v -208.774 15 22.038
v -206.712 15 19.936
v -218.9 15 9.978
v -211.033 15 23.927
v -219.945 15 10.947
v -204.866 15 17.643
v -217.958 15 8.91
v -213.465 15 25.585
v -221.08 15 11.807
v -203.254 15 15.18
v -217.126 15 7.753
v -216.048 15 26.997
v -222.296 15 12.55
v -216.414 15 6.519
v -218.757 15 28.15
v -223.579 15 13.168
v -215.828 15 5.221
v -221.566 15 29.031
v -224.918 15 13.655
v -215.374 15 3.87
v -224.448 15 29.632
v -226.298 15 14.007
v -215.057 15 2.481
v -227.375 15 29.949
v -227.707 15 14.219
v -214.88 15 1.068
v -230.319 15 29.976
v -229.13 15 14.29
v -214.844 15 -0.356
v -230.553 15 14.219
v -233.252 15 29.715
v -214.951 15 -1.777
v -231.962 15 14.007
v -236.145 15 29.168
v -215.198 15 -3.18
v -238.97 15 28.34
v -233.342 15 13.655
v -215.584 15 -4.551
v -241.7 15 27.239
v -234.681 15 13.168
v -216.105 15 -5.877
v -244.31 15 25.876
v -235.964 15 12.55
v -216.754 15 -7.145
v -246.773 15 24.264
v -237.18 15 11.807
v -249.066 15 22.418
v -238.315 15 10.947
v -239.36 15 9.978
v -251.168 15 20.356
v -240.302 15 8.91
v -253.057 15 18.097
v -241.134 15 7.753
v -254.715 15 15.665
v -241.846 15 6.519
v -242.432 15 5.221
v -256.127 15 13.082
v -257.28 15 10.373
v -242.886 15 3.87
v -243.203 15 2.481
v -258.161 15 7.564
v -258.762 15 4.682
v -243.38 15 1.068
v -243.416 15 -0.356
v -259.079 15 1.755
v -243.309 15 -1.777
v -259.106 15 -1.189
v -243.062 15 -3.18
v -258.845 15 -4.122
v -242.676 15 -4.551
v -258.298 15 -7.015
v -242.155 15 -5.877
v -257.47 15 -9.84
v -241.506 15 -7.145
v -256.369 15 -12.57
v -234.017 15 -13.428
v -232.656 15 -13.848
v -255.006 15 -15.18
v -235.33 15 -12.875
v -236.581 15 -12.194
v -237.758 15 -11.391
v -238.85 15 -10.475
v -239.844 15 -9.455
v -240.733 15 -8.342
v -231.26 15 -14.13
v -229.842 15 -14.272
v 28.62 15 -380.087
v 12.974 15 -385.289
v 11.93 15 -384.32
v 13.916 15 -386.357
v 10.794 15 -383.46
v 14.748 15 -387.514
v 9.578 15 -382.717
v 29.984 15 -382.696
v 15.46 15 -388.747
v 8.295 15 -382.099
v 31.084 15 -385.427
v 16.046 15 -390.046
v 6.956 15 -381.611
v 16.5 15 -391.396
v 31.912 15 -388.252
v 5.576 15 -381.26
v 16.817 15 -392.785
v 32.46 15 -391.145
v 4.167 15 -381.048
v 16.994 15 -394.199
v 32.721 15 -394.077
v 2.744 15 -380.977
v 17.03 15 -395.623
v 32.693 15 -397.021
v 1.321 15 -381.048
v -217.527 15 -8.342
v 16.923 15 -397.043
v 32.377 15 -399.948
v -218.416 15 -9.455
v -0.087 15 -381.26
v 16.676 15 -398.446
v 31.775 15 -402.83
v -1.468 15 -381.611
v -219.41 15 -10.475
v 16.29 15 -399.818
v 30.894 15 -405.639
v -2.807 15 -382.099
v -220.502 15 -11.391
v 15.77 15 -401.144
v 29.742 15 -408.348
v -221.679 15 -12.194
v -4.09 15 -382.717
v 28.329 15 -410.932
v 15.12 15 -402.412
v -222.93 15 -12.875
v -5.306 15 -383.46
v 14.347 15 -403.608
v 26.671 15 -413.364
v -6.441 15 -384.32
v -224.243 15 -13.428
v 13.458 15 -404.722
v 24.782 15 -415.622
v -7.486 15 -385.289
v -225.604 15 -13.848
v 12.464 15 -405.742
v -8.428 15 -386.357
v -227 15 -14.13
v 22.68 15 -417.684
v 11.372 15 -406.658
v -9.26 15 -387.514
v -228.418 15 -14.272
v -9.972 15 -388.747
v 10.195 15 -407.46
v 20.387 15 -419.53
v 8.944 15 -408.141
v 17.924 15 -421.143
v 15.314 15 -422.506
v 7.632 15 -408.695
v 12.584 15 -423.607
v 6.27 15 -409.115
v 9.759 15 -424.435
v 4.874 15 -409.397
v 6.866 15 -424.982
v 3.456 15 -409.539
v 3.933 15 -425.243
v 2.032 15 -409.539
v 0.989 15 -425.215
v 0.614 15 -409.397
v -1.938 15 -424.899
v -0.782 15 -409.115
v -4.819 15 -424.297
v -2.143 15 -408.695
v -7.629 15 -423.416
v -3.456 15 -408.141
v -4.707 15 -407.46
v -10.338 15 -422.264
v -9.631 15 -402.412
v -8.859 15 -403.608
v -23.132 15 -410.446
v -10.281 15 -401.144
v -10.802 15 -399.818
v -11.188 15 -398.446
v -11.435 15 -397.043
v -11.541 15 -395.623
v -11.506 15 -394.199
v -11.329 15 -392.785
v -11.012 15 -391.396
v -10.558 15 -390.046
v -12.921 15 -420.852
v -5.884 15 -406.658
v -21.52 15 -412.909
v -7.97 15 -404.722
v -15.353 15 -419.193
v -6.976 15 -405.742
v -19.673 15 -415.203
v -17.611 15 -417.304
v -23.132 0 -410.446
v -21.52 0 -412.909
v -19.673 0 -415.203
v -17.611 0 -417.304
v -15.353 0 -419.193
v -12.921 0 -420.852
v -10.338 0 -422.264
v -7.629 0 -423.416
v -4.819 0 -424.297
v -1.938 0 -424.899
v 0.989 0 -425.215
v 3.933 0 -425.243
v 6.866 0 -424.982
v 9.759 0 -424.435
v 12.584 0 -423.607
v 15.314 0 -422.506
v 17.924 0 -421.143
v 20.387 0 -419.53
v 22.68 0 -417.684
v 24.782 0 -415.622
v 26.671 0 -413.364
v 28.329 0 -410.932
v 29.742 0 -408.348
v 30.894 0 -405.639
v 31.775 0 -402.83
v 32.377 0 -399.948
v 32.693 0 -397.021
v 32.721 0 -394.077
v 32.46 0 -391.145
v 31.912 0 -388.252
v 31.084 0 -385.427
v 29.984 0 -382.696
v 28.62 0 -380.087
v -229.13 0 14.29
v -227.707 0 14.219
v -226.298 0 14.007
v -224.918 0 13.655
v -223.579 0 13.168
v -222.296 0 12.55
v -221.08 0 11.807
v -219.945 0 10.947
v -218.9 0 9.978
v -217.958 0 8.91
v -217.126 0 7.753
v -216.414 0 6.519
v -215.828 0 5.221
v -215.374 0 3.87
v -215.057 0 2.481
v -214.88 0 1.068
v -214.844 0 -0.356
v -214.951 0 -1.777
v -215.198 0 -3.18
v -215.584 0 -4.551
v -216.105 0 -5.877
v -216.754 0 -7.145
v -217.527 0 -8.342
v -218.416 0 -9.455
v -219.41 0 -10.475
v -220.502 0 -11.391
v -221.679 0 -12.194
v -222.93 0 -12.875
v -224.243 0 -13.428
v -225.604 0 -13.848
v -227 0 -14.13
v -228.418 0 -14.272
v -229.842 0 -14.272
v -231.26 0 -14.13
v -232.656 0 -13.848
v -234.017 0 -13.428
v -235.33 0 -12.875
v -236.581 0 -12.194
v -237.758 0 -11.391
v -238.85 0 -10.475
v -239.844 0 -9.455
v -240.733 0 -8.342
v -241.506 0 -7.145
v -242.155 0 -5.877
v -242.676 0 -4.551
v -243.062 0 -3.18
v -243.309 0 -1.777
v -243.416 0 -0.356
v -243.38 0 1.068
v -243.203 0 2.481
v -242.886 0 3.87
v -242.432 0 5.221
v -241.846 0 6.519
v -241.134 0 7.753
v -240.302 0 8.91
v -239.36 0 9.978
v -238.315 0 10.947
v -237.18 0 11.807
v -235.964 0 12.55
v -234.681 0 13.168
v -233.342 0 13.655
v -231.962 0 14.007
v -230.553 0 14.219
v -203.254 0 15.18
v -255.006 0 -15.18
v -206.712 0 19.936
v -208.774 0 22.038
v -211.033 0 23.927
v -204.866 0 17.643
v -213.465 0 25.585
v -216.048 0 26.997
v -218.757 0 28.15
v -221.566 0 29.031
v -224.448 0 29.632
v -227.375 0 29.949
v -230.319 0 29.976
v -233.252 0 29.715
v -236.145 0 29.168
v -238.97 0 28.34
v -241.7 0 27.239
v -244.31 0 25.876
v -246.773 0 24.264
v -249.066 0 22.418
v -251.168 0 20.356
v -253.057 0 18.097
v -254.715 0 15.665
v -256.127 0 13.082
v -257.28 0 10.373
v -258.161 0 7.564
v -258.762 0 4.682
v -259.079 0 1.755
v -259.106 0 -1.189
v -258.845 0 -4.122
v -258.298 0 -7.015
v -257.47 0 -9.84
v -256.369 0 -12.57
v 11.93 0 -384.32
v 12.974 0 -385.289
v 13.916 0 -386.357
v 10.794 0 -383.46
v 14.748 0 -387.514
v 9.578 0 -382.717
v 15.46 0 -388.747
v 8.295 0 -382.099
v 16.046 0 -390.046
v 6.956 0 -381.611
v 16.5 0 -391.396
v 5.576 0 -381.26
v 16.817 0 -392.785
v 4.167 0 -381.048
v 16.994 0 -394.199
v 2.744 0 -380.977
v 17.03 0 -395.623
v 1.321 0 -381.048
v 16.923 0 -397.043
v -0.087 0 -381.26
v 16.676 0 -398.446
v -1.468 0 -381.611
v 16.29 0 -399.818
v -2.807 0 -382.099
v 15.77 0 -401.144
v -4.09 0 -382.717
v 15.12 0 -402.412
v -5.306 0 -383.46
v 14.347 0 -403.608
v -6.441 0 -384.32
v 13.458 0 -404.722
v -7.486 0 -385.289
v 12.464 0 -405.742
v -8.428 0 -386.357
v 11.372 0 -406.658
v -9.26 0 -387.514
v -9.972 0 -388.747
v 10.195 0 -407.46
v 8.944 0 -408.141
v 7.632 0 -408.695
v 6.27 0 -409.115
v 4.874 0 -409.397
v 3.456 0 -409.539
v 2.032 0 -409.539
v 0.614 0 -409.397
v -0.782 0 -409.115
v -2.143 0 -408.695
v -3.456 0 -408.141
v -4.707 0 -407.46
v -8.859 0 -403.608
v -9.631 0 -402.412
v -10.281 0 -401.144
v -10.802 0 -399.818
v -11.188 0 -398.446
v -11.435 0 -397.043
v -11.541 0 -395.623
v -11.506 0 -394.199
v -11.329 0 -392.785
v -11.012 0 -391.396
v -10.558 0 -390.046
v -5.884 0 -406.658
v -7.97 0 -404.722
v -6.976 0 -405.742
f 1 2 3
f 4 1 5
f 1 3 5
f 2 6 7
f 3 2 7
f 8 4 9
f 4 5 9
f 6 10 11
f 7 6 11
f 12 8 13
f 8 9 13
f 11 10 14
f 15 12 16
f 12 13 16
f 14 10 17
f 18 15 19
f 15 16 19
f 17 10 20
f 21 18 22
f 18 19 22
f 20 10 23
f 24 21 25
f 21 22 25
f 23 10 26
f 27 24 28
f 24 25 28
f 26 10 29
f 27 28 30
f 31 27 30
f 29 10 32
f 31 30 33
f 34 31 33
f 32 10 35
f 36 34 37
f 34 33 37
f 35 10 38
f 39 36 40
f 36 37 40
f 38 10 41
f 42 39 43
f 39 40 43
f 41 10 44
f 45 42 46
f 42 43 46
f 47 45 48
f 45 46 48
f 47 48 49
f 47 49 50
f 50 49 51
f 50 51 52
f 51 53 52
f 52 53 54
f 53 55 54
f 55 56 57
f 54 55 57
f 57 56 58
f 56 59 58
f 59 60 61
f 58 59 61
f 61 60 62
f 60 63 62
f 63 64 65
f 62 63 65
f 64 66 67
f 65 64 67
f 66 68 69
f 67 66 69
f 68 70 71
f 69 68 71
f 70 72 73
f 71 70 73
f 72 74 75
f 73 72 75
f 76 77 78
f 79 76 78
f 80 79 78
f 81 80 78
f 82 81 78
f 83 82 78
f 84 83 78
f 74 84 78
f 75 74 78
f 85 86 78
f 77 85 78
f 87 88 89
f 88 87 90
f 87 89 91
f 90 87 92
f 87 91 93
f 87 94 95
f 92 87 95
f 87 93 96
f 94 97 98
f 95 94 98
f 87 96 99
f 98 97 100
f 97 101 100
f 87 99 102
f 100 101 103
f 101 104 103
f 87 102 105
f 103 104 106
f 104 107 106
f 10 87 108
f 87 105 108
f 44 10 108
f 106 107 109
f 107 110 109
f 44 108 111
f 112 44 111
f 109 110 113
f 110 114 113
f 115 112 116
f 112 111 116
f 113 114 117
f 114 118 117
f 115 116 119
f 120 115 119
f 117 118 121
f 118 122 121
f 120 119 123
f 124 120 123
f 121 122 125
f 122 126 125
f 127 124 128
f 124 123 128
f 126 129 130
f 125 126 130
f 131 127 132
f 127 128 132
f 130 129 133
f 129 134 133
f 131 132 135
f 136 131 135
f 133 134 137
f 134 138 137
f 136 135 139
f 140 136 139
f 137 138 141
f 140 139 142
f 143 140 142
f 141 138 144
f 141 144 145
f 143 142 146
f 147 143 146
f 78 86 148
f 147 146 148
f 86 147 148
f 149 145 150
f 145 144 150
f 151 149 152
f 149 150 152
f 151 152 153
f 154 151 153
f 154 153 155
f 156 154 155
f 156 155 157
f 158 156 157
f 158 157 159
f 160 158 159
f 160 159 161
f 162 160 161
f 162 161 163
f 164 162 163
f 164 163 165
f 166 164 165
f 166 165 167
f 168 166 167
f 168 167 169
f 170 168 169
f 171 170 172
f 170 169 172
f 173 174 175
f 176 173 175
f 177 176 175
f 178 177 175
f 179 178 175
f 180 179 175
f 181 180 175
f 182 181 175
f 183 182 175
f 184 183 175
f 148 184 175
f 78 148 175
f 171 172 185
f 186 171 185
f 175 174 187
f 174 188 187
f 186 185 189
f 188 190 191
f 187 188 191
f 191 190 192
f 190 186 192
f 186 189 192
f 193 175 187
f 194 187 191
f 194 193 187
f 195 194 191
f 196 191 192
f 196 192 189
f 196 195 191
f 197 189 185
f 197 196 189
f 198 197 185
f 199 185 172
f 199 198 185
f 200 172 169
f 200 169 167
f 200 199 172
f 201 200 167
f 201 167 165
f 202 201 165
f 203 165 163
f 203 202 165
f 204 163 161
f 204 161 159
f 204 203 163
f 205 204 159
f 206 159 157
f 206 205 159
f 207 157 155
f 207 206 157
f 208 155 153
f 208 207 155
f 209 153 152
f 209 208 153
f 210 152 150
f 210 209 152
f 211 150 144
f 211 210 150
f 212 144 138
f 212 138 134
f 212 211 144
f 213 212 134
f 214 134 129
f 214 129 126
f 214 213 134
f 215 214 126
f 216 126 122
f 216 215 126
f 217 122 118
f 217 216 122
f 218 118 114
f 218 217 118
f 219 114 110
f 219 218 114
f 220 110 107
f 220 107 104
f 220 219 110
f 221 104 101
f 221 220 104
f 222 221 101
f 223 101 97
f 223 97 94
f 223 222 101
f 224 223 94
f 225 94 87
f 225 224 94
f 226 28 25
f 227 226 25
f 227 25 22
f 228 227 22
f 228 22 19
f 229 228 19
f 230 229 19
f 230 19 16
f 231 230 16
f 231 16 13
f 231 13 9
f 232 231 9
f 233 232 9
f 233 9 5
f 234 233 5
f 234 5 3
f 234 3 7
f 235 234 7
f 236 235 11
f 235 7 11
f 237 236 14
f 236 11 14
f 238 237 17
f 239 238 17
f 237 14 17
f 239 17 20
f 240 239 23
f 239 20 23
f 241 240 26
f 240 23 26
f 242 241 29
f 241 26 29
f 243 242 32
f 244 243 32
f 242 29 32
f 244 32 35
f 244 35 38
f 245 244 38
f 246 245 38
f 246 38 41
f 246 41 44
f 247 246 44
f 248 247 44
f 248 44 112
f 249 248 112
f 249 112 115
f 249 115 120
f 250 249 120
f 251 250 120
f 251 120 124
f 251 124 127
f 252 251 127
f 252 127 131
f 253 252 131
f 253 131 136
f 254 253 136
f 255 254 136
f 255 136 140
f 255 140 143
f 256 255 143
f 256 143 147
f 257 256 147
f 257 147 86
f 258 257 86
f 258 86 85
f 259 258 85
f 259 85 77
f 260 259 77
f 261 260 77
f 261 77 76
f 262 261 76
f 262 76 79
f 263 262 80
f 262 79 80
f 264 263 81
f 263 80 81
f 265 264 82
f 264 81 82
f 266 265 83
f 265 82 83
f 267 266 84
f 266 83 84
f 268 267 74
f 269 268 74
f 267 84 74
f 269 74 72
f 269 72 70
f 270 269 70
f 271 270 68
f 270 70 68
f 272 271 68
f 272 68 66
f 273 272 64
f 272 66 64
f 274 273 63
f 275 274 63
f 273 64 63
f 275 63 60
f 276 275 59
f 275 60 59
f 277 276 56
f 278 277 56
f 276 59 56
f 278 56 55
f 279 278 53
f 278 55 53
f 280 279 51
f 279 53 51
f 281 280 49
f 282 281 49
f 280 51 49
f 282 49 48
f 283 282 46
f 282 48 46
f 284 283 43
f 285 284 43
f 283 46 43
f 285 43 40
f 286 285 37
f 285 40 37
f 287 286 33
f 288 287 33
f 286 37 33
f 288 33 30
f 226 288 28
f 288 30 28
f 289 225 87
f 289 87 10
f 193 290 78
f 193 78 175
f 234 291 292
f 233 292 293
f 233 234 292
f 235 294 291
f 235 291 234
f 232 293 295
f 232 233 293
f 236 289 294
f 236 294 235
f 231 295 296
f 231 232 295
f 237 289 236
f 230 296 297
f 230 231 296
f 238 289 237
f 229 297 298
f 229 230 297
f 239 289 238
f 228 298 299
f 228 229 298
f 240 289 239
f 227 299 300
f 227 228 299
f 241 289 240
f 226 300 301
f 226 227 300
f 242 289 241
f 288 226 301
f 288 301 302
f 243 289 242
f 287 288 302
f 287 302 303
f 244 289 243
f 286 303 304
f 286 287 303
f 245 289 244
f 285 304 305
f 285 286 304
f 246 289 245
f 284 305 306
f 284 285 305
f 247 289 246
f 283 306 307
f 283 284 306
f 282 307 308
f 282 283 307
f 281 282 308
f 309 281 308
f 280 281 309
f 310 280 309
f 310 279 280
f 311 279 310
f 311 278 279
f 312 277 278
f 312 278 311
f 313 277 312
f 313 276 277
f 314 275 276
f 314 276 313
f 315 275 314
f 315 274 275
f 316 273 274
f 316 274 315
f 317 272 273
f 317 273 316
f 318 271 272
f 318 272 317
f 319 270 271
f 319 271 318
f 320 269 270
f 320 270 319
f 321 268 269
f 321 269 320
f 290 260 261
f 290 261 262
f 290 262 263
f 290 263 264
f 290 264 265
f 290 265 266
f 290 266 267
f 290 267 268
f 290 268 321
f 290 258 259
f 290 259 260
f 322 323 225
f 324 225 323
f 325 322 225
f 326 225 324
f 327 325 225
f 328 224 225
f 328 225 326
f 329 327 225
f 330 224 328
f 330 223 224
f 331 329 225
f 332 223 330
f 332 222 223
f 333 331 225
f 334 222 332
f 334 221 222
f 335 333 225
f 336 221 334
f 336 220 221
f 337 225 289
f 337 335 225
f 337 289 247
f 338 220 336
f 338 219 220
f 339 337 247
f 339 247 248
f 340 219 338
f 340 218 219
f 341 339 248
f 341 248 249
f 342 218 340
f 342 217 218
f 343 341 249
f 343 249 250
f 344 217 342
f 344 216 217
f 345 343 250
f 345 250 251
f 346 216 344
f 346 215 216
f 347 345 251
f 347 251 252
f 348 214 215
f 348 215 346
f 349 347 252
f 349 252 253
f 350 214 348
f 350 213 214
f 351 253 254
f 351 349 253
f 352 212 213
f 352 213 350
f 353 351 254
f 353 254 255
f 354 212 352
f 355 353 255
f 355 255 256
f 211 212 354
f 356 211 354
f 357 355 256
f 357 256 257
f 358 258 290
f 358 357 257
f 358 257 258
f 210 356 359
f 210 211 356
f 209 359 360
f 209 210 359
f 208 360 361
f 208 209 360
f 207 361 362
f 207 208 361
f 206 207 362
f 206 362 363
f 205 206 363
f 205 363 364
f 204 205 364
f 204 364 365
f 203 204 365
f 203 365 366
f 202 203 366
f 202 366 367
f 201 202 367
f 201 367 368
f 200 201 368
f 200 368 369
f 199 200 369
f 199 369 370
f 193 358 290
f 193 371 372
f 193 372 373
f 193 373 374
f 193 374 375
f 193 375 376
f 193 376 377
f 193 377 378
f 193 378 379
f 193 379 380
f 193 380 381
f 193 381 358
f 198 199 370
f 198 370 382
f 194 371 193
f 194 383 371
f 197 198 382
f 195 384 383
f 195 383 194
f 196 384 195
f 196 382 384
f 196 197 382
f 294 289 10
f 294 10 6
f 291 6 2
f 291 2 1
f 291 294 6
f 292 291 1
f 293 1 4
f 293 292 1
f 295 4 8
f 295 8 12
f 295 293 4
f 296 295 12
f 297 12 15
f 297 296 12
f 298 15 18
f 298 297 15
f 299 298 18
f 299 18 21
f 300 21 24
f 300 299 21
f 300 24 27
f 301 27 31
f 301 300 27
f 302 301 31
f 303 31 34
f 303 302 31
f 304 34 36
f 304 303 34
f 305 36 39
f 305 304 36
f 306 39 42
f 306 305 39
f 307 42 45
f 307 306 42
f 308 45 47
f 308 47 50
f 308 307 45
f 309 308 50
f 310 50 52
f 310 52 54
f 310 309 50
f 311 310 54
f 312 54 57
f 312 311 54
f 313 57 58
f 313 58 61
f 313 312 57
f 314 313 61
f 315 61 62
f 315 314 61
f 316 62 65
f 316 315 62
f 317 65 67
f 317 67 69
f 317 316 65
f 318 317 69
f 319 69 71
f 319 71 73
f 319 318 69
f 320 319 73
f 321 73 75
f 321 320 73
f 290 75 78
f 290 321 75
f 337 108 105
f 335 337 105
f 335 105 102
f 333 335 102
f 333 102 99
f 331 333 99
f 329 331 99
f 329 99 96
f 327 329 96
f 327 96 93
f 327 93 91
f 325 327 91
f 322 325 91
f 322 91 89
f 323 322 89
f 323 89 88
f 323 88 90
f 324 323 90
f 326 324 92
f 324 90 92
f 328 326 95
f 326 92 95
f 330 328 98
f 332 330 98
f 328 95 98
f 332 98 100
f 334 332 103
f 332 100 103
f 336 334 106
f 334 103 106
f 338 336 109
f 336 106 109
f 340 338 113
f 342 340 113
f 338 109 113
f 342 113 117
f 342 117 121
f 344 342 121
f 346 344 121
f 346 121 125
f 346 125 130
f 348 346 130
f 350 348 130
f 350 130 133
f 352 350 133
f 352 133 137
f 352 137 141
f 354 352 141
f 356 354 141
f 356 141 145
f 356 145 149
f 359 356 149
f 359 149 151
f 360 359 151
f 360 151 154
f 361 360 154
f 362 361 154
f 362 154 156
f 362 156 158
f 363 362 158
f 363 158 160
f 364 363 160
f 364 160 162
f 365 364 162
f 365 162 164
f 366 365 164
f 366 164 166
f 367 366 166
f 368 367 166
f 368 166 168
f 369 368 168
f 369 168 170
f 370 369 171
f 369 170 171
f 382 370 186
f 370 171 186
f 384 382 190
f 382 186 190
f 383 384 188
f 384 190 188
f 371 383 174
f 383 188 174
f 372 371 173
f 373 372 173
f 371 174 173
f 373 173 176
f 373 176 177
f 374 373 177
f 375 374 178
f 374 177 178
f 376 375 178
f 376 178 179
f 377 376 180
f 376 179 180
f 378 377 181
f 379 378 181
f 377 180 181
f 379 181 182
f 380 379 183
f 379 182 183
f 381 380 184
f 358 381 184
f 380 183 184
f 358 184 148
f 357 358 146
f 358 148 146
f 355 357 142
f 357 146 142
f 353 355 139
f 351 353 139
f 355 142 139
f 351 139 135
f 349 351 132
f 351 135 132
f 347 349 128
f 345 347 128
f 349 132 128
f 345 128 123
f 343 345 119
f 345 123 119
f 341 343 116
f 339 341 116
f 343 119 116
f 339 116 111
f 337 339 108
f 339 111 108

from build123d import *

# Parameters (mm, degrees)
SALIENTE_EXTRUIR1_DEPTH = 15
CROQUIS3_R              = 14.29
CORTAR_EXTRUIR2_DEPTH   = 499.221807184


with BuildPart() as part:
    # Croquis1 → Saliente-Extruir1 (new body)
    with BuildSketch(Plane(origin=(0, 0, 0), x_dir=(1, 0, 0), z_dir=(0, 1, 0))):
        with BuildLine():
            Line((28.62028588, 380.086840422), (-203.253807163, -15.179678662))
            ThreePointArc((-203.253807163, -15.179678662), (-244.309678662, -25.876192837), (-255.006192837, 15.179678662))
            Line((-255.006192837, 15.179678662), (-23.132099794, 410.446197745))
            ThreePointArc((-23.132099794, 410.446197745), (17.923771705, 421.142711921), (28.62028588, 380.086840422))
        make_face()
    extrude(amount=SALIENTE_EXTRUIR1_DEPTH)

    # Croquis3 → Cortar-Extruir2 (cut, through all)
    with BuildSketch(Plane(origin=(0, 15, 0), x_dir=(1, 0, 0), z_dir=(0, 1, 0))):
        with Locations(Location((-229.13, 0, 0), (0, 0, 270))):
            Circle(CROQUIS3_R)
        with Locations(Location((2.744093043, 395.266519084, 0), (0, 0, 270))):
            Circle(CROQUIS3_R)
    extrude(amount=-CORTAR_EXTRUIR2_DEPTH, mode=Mode.SUBTRACT)


solid = part.part
